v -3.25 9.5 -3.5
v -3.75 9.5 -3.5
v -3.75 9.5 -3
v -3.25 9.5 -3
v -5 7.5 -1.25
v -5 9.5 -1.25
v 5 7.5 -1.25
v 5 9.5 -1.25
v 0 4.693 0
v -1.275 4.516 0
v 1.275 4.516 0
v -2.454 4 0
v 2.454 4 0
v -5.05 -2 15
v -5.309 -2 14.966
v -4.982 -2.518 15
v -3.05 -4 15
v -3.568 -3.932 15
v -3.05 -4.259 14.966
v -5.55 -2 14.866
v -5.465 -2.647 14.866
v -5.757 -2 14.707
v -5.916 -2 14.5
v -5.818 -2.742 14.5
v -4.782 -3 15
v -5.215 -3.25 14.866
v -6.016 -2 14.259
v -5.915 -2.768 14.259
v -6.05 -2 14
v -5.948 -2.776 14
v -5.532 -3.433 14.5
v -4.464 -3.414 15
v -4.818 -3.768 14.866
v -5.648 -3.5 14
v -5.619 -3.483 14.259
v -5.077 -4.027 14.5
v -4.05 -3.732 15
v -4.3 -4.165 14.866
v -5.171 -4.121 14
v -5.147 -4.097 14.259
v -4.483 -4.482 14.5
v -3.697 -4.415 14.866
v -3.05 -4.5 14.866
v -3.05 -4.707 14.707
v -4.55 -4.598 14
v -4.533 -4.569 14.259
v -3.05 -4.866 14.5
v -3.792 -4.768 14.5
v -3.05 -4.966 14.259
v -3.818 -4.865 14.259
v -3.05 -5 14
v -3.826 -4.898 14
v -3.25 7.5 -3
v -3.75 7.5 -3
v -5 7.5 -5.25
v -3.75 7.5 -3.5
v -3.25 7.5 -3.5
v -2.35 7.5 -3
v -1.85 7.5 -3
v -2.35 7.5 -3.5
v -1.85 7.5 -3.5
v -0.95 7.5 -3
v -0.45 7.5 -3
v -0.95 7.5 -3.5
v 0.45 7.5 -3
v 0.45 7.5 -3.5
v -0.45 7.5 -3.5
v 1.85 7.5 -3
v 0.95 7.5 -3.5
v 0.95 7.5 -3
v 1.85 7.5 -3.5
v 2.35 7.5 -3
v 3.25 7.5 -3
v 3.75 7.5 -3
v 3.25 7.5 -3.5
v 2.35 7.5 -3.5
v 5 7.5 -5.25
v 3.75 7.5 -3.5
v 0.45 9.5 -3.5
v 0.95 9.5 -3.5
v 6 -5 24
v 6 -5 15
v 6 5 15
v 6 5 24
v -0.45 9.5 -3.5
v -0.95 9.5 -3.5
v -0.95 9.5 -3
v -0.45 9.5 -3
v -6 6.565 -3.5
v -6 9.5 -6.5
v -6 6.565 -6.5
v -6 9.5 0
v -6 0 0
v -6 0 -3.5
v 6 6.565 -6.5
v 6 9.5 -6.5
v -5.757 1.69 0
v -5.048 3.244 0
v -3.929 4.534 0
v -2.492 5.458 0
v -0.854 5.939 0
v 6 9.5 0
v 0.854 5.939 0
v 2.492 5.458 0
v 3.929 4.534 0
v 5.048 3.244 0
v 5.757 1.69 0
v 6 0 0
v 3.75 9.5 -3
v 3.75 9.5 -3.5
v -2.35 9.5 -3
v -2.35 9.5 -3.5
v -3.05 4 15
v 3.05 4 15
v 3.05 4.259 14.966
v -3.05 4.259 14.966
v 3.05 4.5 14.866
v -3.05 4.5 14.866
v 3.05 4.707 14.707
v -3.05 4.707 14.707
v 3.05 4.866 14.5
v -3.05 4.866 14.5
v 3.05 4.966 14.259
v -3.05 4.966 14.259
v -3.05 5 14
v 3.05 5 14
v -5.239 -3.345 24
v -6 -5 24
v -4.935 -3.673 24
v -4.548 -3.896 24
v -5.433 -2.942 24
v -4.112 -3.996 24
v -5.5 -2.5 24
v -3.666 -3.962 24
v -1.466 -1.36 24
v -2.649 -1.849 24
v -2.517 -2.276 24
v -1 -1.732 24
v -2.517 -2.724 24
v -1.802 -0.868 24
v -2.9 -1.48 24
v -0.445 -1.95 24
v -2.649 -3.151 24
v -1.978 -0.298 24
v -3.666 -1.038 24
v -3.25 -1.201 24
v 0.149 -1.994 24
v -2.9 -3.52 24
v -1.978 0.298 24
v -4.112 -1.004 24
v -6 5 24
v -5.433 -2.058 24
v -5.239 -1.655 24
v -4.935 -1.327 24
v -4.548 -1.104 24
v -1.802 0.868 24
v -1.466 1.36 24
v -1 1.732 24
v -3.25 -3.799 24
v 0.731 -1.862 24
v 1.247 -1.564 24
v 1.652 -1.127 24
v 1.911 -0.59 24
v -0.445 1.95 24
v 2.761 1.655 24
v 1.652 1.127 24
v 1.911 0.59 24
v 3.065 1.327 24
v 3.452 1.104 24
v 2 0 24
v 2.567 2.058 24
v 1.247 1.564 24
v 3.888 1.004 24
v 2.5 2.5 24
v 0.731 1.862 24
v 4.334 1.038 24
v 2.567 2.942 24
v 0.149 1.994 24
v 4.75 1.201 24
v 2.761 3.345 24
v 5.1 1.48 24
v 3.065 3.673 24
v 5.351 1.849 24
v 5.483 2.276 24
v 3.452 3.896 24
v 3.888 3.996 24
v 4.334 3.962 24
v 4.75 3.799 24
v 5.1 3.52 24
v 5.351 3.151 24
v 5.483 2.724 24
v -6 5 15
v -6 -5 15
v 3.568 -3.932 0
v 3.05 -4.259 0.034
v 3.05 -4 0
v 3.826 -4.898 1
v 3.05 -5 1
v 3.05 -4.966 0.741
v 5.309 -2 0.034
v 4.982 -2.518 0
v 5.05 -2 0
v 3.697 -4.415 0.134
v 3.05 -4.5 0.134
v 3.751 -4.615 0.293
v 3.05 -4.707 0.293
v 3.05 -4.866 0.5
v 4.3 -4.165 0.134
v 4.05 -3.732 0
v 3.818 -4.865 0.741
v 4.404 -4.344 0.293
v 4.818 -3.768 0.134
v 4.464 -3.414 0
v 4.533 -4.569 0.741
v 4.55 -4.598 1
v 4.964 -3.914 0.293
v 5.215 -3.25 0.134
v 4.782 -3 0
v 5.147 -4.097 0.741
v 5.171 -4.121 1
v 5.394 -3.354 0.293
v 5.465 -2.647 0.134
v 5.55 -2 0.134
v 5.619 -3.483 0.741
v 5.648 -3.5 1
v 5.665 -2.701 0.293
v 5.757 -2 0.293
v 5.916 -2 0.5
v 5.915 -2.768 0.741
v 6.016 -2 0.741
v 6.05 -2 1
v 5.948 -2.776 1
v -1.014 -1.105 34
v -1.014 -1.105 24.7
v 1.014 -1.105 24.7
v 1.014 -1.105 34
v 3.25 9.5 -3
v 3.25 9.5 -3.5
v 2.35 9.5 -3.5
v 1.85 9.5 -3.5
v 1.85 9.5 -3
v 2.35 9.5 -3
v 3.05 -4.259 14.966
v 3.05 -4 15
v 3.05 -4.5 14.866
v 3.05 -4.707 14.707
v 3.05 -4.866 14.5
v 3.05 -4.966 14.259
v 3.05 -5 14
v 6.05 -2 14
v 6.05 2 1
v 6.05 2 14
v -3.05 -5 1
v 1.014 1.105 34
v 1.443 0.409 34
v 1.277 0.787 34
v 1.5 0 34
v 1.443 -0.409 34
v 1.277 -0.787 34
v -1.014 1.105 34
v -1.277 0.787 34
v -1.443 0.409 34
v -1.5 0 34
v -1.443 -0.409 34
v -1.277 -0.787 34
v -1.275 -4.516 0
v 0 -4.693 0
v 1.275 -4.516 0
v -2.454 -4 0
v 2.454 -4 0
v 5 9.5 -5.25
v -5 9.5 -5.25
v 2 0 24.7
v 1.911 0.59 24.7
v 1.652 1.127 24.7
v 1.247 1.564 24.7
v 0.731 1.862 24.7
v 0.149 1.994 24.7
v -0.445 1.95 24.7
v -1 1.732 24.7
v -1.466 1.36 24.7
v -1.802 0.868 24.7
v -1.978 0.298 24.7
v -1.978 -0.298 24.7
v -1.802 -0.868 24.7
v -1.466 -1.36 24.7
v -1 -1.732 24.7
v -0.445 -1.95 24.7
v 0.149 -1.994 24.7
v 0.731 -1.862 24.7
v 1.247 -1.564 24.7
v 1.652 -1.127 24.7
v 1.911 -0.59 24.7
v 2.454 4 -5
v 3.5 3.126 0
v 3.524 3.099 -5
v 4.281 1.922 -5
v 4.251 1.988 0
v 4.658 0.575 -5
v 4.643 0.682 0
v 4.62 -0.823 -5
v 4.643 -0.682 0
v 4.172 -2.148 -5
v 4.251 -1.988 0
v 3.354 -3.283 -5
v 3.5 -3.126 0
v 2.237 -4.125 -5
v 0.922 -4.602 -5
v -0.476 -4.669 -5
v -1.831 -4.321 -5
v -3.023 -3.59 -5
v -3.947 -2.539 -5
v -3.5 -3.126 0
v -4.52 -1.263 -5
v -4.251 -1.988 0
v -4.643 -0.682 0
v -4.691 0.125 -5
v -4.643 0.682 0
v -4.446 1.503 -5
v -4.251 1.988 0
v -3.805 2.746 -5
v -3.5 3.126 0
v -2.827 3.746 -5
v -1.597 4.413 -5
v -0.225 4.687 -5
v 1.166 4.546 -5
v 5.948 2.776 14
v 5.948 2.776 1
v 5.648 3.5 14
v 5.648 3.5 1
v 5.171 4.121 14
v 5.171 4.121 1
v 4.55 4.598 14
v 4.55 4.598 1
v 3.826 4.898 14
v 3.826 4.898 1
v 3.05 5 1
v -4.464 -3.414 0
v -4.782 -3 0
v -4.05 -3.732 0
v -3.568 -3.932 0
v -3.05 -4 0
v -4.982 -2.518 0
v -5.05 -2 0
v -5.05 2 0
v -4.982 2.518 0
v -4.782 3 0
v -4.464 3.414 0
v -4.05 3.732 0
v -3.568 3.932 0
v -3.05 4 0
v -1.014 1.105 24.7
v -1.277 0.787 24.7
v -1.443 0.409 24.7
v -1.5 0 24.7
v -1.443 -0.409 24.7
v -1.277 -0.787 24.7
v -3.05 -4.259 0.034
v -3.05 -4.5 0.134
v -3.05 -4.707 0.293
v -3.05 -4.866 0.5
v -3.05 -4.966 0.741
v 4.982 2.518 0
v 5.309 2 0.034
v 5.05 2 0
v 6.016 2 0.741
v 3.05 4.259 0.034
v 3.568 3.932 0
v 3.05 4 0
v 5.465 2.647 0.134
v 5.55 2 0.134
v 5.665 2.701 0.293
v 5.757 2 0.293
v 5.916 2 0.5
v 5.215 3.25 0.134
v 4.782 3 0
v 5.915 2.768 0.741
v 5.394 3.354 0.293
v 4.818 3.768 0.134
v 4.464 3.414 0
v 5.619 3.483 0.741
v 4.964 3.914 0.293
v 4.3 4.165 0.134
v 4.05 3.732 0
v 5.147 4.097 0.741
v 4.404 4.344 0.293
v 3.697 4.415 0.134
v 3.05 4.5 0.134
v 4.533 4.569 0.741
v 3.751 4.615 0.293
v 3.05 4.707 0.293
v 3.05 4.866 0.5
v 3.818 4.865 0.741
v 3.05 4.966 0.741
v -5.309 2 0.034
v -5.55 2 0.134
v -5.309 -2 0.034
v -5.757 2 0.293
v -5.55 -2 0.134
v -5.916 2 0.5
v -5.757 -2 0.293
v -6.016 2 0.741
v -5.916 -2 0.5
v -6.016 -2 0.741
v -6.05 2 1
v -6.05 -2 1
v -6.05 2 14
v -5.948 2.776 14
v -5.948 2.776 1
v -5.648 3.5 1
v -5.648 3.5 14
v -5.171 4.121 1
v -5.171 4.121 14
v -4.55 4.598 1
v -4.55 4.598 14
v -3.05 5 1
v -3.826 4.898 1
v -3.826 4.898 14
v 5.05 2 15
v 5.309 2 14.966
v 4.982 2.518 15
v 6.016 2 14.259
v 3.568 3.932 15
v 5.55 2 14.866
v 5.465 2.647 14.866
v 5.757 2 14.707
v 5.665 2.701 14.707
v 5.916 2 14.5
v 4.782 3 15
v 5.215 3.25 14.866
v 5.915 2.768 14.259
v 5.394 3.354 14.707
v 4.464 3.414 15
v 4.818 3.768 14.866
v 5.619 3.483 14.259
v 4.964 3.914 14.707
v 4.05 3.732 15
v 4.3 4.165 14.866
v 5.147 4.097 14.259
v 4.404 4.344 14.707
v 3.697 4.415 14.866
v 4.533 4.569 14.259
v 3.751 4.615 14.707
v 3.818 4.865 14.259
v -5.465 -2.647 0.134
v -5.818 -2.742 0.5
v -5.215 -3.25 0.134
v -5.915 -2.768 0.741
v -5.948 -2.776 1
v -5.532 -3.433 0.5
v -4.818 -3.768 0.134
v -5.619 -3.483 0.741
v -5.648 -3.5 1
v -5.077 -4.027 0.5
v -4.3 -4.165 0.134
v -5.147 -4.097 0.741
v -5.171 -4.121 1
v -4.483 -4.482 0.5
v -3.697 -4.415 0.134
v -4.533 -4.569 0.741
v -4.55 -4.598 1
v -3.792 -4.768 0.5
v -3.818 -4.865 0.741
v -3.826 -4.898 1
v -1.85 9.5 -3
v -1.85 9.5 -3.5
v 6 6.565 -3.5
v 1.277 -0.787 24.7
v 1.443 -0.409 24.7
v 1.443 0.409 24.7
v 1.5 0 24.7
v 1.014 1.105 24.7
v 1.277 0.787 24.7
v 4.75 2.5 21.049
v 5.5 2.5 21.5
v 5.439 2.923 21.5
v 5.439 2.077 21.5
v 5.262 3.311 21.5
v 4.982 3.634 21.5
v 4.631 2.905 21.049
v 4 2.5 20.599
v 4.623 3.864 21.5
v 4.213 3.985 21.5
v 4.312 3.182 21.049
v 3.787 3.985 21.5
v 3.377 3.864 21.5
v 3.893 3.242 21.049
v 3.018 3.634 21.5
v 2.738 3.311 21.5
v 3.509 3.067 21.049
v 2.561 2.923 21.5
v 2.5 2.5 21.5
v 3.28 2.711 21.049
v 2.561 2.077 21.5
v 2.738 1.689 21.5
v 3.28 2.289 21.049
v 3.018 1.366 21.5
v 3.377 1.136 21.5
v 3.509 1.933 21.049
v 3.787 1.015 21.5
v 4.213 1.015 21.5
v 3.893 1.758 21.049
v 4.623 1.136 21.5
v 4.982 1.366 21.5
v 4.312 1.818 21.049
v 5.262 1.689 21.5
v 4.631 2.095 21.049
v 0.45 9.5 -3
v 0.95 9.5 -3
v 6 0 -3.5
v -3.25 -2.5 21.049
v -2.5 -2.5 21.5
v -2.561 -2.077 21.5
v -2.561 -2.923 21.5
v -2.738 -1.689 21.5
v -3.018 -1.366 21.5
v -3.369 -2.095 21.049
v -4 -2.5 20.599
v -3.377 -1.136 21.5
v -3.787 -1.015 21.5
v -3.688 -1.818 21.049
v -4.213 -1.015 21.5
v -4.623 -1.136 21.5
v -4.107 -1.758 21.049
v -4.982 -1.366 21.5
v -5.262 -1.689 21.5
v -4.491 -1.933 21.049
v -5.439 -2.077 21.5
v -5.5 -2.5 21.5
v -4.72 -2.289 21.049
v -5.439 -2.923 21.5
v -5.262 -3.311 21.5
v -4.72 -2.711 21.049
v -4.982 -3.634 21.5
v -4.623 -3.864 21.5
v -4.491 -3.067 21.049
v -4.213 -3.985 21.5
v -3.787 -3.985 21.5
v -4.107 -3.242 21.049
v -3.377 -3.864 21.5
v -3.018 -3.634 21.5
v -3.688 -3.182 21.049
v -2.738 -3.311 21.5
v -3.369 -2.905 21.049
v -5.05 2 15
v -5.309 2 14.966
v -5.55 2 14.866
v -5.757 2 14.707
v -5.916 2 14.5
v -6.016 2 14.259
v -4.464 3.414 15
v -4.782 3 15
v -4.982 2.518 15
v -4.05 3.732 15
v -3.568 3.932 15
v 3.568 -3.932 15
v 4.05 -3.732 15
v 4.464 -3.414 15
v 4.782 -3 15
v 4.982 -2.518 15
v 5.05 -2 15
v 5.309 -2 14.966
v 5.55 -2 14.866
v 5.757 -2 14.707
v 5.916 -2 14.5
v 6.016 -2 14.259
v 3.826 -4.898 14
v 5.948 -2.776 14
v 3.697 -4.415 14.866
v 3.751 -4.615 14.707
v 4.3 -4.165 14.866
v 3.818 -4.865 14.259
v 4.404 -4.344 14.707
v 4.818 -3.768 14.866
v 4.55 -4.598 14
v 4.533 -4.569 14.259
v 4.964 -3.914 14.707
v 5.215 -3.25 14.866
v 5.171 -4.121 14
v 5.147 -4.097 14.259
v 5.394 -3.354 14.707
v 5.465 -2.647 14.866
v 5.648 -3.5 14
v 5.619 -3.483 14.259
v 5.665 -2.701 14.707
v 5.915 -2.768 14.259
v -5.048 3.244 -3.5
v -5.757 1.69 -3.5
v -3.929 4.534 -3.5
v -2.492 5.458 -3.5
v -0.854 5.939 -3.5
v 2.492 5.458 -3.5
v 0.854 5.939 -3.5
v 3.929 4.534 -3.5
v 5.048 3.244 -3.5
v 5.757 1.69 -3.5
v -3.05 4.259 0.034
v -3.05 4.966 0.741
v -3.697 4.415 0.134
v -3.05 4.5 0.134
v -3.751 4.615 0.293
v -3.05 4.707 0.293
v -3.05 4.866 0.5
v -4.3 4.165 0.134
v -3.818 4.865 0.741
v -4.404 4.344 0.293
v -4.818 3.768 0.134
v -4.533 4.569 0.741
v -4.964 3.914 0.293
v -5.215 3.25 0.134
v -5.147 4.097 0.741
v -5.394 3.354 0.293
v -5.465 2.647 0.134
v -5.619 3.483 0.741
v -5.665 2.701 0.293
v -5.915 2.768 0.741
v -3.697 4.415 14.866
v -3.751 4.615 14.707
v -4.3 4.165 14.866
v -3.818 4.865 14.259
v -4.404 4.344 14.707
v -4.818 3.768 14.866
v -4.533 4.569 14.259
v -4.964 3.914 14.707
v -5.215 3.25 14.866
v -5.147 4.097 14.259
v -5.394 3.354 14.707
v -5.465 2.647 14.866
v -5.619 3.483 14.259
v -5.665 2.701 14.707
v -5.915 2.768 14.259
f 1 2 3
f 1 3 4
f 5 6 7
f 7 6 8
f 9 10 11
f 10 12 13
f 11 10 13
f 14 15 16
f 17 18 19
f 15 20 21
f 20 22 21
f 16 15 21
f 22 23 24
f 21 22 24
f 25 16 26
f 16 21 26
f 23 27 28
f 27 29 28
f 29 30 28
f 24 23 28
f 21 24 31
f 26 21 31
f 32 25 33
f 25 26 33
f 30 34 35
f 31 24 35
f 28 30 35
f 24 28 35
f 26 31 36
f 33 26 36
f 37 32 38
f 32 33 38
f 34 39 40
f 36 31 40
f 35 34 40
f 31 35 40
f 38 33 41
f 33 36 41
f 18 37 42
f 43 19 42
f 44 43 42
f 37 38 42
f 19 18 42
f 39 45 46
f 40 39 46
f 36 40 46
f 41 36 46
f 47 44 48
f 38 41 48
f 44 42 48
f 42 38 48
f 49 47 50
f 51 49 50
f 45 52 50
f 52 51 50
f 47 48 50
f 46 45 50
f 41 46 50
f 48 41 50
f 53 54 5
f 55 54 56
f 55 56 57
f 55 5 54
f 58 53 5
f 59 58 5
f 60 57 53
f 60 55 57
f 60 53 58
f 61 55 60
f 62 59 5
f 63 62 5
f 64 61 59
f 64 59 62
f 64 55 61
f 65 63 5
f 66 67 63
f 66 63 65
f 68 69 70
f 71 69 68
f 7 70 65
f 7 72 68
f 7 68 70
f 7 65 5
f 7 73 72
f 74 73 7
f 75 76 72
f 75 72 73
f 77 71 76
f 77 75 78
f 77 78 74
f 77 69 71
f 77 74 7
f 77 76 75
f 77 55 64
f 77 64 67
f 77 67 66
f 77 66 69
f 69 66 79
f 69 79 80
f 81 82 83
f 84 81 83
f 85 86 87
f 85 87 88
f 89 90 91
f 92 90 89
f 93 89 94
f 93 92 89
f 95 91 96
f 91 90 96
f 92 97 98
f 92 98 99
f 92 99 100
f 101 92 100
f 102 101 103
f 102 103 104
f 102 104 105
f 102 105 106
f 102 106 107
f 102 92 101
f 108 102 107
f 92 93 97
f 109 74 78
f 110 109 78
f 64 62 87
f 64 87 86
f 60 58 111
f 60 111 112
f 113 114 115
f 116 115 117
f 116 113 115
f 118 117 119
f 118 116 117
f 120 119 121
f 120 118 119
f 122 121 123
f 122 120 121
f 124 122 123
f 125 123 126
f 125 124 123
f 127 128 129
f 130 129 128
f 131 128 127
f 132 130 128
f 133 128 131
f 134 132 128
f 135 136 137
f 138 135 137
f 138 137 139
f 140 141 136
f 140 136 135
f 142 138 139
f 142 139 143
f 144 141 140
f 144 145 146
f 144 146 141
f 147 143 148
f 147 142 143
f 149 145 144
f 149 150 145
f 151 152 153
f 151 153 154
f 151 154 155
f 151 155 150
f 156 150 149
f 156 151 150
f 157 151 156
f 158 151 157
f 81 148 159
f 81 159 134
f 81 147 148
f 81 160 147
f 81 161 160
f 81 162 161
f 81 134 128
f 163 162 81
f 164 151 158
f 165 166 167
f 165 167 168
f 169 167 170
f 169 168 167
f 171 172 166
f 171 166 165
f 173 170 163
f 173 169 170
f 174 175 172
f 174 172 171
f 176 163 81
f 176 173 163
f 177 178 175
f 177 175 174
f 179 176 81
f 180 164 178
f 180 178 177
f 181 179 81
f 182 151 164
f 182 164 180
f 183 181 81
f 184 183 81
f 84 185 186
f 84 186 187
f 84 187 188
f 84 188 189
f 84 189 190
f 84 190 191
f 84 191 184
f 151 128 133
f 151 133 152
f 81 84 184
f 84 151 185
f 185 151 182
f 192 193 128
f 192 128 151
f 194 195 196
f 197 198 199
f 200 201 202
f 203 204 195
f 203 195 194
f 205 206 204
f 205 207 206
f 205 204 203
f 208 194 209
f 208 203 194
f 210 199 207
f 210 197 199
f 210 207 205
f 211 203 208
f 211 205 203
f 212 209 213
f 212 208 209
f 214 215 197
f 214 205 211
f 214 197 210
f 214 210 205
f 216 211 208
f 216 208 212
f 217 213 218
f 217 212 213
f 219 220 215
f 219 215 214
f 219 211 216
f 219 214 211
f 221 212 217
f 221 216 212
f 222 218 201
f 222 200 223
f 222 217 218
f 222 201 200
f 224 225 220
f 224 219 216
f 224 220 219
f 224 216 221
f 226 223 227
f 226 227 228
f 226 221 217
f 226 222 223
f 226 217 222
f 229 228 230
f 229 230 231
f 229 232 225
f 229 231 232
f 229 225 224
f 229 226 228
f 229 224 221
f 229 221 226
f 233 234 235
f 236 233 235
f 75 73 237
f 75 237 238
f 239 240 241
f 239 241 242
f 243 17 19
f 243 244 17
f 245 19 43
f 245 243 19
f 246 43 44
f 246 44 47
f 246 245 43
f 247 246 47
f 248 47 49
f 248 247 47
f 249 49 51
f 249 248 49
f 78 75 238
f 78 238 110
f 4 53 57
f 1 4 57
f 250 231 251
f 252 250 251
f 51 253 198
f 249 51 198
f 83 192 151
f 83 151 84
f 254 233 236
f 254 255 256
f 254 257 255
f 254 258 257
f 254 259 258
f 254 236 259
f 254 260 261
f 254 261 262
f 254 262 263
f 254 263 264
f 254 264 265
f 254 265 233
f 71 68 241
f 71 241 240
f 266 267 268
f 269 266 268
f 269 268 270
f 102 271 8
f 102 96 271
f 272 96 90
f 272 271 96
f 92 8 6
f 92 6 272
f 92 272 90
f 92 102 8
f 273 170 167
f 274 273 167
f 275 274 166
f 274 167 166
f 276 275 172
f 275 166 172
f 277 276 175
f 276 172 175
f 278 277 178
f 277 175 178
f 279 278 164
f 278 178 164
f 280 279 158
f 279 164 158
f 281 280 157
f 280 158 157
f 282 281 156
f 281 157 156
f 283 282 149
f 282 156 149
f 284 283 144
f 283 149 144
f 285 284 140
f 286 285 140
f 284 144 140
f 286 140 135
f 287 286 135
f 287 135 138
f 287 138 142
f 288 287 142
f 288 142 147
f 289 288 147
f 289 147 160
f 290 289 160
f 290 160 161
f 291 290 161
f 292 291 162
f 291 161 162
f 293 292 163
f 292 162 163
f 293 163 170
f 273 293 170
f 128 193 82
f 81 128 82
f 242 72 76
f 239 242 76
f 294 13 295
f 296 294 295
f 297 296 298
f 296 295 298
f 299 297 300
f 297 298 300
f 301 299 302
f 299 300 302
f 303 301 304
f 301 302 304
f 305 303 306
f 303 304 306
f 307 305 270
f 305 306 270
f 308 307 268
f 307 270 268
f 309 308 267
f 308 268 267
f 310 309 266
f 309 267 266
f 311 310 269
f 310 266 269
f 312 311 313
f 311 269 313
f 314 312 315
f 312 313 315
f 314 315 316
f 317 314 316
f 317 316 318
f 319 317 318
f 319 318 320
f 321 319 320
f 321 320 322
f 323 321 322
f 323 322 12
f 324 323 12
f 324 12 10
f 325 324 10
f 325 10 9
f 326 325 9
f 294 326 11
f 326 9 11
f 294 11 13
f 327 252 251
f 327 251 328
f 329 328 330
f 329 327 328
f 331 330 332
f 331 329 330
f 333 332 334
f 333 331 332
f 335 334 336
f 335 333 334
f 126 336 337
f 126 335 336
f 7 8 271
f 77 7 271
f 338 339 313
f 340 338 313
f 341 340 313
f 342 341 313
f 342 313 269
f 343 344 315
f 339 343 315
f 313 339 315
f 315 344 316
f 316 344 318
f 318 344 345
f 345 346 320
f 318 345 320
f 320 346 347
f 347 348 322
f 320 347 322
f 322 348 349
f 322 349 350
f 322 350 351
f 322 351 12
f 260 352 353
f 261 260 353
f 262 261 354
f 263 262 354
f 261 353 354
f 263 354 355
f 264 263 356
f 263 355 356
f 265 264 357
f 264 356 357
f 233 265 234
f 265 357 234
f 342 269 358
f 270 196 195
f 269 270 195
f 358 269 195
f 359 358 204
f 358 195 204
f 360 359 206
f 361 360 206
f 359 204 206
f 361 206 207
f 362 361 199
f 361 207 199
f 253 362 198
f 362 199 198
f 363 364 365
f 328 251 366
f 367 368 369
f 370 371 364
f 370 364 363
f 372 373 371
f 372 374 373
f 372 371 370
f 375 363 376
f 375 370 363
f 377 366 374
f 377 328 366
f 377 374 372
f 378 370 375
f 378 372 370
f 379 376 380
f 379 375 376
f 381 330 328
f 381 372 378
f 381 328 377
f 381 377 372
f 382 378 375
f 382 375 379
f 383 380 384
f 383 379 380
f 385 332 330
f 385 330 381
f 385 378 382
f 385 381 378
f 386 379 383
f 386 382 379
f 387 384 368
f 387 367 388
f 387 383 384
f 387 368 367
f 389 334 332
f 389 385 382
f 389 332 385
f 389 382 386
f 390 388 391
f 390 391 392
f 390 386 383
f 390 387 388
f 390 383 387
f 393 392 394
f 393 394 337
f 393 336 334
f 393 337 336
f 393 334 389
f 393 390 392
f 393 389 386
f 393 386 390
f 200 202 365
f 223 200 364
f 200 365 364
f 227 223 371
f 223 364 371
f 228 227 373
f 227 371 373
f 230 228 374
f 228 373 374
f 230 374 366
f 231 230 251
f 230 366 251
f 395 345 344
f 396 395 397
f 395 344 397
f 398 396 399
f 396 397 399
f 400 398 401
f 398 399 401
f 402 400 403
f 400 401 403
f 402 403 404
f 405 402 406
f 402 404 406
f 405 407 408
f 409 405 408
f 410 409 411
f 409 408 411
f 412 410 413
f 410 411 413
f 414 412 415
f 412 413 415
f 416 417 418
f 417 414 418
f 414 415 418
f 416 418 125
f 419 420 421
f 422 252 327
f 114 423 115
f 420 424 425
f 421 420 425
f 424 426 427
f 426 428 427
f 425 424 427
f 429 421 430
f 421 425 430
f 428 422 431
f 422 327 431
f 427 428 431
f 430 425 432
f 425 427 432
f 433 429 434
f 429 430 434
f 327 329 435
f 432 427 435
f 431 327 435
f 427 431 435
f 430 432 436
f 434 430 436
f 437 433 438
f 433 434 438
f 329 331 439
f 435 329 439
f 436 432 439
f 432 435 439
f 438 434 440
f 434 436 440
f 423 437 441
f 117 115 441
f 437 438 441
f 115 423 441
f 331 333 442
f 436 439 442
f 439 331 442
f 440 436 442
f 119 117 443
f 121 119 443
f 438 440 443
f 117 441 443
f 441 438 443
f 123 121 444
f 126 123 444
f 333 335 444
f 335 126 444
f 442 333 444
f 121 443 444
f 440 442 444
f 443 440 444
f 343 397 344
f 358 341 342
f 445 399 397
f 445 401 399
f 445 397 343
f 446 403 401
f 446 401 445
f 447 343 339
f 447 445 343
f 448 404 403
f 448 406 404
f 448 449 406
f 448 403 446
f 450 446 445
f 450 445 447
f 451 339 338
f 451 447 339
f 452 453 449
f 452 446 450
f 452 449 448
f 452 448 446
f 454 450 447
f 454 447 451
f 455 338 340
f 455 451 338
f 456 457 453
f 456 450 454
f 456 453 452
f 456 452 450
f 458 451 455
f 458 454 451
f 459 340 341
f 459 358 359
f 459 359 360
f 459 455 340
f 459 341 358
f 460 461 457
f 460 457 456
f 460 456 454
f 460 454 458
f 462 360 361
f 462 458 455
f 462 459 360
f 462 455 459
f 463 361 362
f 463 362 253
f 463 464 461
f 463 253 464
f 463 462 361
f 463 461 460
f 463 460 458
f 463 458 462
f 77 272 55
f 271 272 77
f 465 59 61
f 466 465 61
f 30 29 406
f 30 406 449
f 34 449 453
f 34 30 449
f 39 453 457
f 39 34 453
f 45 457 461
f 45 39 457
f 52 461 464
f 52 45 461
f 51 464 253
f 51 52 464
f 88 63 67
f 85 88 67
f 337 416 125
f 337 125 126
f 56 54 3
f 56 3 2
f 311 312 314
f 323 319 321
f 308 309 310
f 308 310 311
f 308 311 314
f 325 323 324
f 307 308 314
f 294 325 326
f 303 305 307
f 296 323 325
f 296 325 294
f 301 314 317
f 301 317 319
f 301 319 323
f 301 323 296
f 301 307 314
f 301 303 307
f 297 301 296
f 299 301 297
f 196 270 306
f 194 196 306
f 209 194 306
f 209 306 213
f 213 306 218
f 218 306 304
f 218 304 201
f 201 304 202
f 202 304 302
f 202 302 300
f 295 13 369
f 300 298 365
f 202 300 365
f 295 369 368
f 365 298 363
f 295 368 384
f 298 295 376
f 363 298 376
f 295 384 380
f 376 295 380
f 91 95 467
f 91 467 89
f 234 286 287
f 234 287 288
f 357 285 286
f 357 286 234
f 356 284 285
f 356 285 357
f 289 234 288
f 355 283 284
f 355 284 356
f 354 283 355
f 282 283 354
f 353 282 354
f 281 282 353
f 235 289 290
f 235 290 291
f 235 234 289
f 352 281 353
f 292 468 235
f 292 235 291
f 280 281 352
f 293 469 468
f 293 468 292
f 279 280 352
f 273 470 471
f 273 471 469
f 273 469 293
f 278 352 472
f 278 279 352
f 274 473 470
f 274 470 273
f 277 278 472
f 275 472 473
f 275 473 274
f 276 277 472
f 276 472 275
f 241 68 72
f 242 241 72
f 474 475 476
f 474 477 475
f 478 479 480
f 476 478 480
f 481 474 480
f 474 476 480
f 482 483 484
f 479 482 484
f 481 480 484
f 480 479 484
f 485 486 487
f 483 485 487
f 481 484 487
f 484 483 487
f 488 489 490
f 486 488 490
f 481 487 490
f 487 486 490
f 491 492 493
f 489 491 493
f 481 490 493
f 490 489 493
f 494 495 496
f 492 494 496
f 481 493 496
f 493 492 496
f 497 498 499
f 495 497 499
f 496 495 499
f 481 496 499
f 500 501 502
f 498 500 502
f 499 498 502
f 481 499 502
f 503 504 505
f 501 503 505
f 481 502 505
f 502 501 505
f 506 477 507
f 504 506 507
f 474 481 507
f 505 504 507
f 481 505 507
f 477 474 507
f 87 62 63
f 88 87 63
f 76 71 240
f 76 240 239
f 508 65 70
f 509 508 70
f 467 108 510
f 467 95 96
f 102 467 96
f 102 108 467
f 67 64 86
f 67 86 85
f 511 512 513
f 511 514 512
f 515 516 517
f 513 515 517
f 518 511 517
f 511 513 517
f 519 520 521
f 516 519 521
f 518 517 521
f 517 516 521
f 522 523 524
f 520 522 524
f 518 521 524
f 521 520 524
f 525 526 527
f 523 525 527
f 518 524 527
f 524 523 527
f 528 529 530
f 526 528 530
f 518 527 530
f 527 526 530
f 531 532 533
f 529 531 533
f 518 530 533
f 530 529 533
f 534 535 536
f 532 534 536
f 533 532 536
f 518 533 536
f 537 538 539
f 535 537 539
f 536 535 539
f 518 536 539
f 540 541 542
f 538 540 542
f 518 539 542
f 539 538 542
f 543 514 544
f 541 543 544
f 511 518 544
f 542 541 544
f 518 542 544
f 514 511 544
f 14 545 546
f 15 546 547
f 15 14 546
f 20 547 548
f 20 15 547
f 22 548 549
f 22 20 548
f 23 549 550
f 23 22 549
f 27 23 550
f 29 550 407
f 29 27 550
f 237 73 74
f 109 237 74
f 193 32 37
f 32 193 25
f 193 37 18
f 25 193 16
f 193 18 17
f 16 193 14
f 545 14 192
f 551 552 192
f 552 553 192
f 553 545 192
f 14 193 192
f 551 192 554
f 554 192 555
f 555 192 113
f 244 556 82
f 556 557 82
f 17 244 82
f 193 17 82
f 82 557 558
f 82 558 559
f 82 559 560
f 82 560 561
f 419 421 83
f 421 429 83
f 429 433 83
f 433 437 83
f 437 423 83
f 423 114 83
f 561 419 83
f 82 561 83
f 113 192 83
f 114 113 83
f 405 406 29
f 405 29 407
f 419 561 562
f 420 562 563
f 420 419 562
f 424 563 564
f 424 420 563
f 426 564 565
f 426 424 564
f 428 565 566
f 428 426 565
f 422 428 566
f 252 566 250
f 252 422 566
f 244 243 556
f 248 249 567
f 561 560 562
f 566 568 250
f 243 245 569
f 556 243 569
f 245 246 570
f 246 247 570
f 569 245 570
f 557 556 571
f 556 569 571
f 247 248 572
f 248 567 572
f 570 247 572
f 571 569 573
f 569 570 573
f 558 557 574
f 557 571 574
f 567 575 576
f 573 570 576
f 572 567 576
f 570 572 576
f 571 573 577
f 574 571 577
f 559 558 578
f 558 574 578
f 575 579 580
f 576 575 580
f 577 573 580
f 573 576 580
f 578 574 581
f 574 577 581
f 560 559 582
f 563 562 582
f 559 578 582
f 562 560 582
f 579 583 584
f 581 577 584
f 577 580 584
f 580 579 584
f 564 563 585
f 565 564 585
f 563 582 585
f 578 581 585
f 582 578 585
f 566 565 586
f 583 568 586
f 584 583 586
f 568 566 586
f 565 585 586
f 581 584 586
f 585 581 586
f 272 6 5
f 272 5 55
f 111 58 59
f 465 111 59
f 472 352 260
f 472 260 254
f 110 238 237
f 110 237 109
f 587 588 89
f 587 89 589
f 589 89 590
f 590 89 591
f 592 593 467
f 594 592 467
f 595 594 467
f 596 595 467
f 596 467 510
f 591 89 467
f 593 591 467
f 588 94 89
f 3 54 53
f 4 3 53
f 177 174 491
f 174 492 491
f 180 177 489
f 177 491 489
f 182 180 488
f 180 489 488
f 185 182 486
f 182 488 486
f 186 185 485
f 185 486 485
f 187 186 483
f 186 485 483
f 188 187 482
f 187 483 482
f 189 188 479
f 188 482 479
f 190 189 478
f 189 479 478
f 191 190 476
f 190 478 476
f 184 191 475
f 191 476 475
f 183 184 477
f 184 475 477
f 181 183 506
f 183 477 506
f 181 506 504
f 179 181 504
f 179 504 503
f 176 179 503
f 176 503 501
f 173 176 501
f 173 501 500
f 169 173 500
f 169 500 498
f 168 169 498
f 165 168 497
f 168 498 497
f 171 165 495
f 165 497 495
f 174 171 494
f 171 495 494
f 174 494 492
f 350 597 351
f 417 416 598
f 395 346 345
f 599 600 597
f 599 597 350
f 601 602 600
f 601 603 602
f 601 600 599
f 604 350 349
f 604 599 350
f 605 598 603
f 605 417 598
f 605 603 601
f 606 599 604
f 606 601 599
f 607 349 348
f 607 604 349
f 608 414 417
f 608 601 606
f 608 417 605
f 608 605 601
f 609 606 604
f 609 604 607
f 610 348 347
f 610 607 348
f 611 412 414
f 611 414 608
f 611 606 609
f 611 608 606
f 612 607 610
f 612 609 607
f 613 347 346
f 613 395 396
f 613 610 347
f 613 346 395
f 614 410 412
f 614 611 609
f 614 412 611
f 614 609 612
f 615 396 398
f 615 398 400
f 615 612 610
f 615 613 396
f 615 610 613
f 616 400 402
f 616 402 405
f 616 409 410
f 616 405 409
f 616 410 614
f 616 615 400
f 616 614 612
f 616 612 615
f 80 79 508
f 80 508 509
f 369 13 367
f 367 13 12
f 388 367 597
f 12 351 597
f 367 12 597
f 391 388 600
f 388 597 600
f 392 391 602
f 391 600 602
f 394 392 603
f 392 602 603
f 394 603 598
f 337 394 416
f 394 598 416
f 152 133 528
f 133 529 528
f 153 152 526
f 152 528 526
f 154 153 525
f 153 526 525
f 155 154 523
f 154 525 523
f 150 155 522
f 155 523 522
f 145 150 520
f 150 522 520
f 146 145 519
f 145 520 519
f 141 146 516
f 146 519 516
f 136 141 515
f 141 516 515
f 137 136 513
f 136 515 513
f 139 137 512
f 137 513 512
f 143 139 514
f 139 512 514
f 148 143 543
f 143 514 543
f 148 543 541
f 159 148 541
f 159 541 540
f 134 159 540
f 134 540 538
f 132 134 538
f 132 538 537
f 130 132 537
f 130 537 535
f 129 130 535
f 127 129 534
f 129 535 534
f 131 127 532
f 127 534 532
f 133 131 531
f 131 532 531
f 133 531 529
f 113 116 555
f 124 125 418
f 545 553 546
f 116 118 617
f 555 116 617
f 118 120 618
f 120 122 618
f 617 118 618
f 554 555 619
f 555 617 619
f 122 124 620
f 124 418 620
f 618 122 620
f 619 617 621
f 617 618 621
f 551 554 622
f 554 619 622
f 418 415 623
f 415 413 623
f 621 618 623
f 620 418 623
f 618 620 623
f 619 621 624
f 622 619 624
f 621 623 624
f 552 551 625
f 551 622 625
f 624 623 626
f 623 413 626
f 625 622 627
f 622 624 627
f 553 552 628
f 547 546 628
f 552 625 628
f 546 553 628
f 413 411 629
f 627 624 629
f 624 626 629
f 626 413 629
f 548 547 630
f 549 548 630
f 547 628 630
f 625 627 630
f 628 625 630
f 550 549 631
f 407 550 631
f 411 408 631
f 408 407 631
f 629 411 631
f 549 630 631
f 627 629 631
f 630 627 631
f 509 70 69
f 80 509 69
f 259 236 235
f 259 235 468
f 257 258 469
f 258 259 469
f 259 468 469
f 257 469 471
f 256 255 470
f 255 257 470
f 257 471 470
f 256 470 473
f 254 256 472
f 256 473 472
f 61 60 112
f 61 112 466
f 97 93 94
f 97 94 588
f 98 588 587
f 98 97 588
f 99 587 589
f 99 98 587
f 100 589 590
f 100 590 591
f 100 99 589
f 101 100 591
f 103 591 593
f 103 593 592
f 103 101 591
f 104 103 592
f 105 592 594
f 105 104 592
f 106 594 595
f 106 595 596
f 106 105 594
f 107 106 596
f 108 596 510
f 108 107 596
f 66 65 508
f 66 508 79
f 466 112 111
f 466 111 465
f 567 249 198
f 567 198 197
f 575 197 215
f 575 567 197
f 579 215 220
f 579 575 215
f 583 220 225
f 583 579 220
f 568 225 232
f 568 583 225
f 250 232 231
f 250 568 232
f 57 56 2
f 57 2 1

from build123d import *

# Parameters (mm, degrees)
SKETCH_3_W                 = 12.1
SKETCH_3_H                 = 10
EXTRUDE_2_DEPTH            = 15
FILLET_3_R                 = 3
FILLET_4_R                 = 1
SKETCH_4_W                 = 12
SKETCH_4_H                 = 10
EXTRUDE_3_DEPTH            = 9
SKETCH_5_R                 = 2
EXTRUDE_4_DEPTH            = 0.7
SKETCH_6_R                 = 1.5
EXTRUDE_5_DEPTH            = 9.3
HOLE_WIZARD_3_0_3_1_D      = 3
HOLE_WIZARD_3_0_3_1_DEPTH  = 2.5
HOLE_WIZARD_3_0_3_1_TIP    = 0.901290929
EXTRUDE_7_DEPTH            = 6.5
SKETCH_11_R                = 4.692908565
EXTRUDE_8_DEPTH            = 5
CUT_EXTRUDE_1_DEPTH        = 3
SKETCH_13_W                = 10
SKETCH_13_H                = 4
CUT_EXTRUDE_2_DEPTH        = 2
SKETCH_14_W                = 0.5
SKETCH_14_H                = 0.5
EXTRUDE_9_DEPTH            = 2
PATTERN_LINEAR_1_COUNT     = 3
PATTERN_LINEAR_1_PITCH     = 1.4
PATTERN_LINEAR_1_COL_COUNT = 4
PATTERN_LINEAR_1_COL_PITCH = 1.4
CUT_EXTRUDE_START          = -9.3
CUT_EXTRUDE_3_DEPTH        = 9.3


with BuildPart() as part:
    # 草图3 → 凸台-拉伸2 (new body)
    with BuildSketch(Plane.XY):
        Rectangle(SKETCH_3_W, SKETCH_3_H)
    extrude(amount=EXTRUDE_2_DEPTH)

    # 圆角3
    fillet_3_edges = [part.edges().sort_by_distance(p)[0] for p in [
        (6.05, -5, 7.5),
        (-6.05, -5, 7.5),
        (-6.05, 5, 7.5),
        (6.05, 5, 7.5),
    ]]
    fillet(fillet_3_edges, radius=FILLET_3_R)

    # 圆角4
    fillet_4_edges = [part.edges().sort_by_distance(p)[0] for p in [
        (0, -5, 0),
        (0, -5, 15),
        (6.05, 0, 0),
        (-6.05, 0, 0),
        (0, 5, 0),
        (5.171320344, 4.121320344, 0),
        (5.171320344, -4.121320344, 0),
        (-5.171320344, 4.121320344, 0),
        (-5.171320344, -4.121320344, 0),
        (-6.05, 0, 15),
        (6.05, 0, 15),
        (0, 5, 15),
        (5.171320344, 4.121320344, 15),
        (5.171320344, -4.121320344, 15),
        (-5.171320344, 4.121320344, 15),
        (-5.171320344, -4.121320344, 15),
    ]]
    fillet(fillet_4_edges, radius=FILLET_4_R)

    # 草图4 → 凸台-拉伸3 (add)
    with BuildSketch(Plane.XY.offset(15)):
        Rectangle(SKETCH_4_W, SKETCH_4_H)
    extrude(amount=EXTRUDE_3_DEPTH)

    # 草图5 → 凸台-拉伸4 (add)
    with BuildSketch(Plane.XY.offset(24)):
        Circle(SKETCH_5_R)
    extrude(amount=EXTRUDE_4_DEPTH)

    # 草图6 → 凸台-拉伸5 (add)
    with BuildSketch(Plane.XY.offset(24.7)):
        Circle(SKETCH_6_R)
    extrude(amount=EXTRUDE_5_DEPTH)

    # Ø3.0 (3) 直径孔1
    with Locations(Plane.XY.offset(24)):
        with Locations((-4, -2.5), (4, 2.5)):
            Hole(HOLE_WIZARD_3_0_3_1_D / 2, depth=HOLE_WIZARD_3_0_3_1_DEPTH)
            with Locations((0, 0, -(HOLE_WIZARD_3_0_3_1_DEPTH + HOLE_WIZARD_3_0_3_1_TIP / 2))):  # 118° drill point
                Cone(0, HOLE_WIZARD_3_0_3_1_D / 2, HOLE_WIZARD_3_0_3_1_TIP, mode=Mode.SUBTRACT)

    # 草图11 → 凸台-拉伸8 (add)
    with BuildSketch(Plane(origin=(0, 0, 0), x_dir=(-1, 0, 0), z_dir=(0, 0, -1))):
        with Locations(Location((0, 0, 0), (0, 0, 121.531818608))):
            Circle(SKETCH_11_R)
    extrude(amount=EXTRUDE_8_DEPTH)

    # 草图15 → 切除-拉伸3 (cut)
    with BuildSketch(Plane.XY.offset(34).offset(CUT_EXTRUDE_START)):
        with BuildLine():
            Line((-1.014446226, 1.104942919), (1.014446226, 1.104942919))
            ThreePointArc((1.014446226, 1.104942919), (0, 1.5), (-1.014446226, 1.104942919))
        make_face()
        with BuildLine():
            Line((-1.014446226, -1.104942919), (1.014446226, -1.104942919))
            ThreePointArc((1.014446226, -1.104942919), (0, -1.5), (-1.014446226, -1.104942919))
        make_face()
    extrude(amount=CUT_EXTRUDE_3_DEPTH, mode=Mode.SUBTRACT)


with BuildPart() as body_2:
    # 草图10 → 凸台-拉伸7 (new body)
    with BuildSketch(Plane(origin=(0, 0, 0), x_dir=(-1, 0, 0), z_dir=(0, 0, -1))):
        with BuildLine():
            Line((-6, 0), (-6, 9.5))
            Line((-6, 9.5), (6, 9.5))
            Line((6, 9.5), (6, 0))
            ThreePointArc((6, 0), (0, 6), (-6, 0))
        make_face()
    extrude(amount=EXTRUDE_7_DEPTH)

    # 草图12 → 切除-拉伸1 (cut)
    with BuildSketch(Plane(origin=(0, 0, -6.5), x_dir=(-1, 0, 0), z_dir=(0, 0, -1))):
        with BuildLine():
            Line((-6, 0), (-6, 6.565194245))
            Line((-6, 6.565194245), (6, 6.565194245))
            Line((6, 6.565194245), (6, 0))
            ThreePointArc((6, 0), (0, 6), (-6, 0))
        make_face()
    extrude(amount=-CUT_EXTRUDE_1_DEPTH, mode=Mode.SUBTRACT)

    # 草图13 → 切除-拉伸2 (cut)
    with BuildSketch(Plane(origin=(0, 9.5, 0), x_dir=(1, 0, 0), z_dir=(0, 1, 0))):
        with Locations((0, 3.25)):
            Rectangle(SKETCH_13_W, SKETCH_13_H)
    extrude(amount=-CUT_EXTRUDE_2_DEPTH, mode=Mode.SUBTRACT)

    # 草图14 → 凸台-拉伸9 (add)
    with BuildSketch(Plane(origin=(0, 7.5, 0), x_dir=(1, 0, 0), z_dir=(0, 1, 0))):
        with Locations((-0.7, 3.25)):
            Rectangle(SKETCH_14_W, SKETCH_14_H)
    extrude_9 = extrude(amount=EXTRUDE_9_DEPTH)

    # 阵列(线性)1: 凸台-拉伸9 ×3
    with Locations(*[(-i * PATTERN_LINEAR_1_PITCH, 0, 0) for i in range(1, PATTERN_LINEAR_1_COUNT)]):
        add(extrude_9)

    # 阵列(线性)1 col: 凸台-拉伸9 ×4
    with Locations(*[(i * PATTERN_LINEAR_1_COL_PITCH, 0, 0) for i in range(1, PATTERN_LINEAR_1_COL_COUNT)]):
        add(extrude_9)


solid = Compound([part.part, body_2.part])
